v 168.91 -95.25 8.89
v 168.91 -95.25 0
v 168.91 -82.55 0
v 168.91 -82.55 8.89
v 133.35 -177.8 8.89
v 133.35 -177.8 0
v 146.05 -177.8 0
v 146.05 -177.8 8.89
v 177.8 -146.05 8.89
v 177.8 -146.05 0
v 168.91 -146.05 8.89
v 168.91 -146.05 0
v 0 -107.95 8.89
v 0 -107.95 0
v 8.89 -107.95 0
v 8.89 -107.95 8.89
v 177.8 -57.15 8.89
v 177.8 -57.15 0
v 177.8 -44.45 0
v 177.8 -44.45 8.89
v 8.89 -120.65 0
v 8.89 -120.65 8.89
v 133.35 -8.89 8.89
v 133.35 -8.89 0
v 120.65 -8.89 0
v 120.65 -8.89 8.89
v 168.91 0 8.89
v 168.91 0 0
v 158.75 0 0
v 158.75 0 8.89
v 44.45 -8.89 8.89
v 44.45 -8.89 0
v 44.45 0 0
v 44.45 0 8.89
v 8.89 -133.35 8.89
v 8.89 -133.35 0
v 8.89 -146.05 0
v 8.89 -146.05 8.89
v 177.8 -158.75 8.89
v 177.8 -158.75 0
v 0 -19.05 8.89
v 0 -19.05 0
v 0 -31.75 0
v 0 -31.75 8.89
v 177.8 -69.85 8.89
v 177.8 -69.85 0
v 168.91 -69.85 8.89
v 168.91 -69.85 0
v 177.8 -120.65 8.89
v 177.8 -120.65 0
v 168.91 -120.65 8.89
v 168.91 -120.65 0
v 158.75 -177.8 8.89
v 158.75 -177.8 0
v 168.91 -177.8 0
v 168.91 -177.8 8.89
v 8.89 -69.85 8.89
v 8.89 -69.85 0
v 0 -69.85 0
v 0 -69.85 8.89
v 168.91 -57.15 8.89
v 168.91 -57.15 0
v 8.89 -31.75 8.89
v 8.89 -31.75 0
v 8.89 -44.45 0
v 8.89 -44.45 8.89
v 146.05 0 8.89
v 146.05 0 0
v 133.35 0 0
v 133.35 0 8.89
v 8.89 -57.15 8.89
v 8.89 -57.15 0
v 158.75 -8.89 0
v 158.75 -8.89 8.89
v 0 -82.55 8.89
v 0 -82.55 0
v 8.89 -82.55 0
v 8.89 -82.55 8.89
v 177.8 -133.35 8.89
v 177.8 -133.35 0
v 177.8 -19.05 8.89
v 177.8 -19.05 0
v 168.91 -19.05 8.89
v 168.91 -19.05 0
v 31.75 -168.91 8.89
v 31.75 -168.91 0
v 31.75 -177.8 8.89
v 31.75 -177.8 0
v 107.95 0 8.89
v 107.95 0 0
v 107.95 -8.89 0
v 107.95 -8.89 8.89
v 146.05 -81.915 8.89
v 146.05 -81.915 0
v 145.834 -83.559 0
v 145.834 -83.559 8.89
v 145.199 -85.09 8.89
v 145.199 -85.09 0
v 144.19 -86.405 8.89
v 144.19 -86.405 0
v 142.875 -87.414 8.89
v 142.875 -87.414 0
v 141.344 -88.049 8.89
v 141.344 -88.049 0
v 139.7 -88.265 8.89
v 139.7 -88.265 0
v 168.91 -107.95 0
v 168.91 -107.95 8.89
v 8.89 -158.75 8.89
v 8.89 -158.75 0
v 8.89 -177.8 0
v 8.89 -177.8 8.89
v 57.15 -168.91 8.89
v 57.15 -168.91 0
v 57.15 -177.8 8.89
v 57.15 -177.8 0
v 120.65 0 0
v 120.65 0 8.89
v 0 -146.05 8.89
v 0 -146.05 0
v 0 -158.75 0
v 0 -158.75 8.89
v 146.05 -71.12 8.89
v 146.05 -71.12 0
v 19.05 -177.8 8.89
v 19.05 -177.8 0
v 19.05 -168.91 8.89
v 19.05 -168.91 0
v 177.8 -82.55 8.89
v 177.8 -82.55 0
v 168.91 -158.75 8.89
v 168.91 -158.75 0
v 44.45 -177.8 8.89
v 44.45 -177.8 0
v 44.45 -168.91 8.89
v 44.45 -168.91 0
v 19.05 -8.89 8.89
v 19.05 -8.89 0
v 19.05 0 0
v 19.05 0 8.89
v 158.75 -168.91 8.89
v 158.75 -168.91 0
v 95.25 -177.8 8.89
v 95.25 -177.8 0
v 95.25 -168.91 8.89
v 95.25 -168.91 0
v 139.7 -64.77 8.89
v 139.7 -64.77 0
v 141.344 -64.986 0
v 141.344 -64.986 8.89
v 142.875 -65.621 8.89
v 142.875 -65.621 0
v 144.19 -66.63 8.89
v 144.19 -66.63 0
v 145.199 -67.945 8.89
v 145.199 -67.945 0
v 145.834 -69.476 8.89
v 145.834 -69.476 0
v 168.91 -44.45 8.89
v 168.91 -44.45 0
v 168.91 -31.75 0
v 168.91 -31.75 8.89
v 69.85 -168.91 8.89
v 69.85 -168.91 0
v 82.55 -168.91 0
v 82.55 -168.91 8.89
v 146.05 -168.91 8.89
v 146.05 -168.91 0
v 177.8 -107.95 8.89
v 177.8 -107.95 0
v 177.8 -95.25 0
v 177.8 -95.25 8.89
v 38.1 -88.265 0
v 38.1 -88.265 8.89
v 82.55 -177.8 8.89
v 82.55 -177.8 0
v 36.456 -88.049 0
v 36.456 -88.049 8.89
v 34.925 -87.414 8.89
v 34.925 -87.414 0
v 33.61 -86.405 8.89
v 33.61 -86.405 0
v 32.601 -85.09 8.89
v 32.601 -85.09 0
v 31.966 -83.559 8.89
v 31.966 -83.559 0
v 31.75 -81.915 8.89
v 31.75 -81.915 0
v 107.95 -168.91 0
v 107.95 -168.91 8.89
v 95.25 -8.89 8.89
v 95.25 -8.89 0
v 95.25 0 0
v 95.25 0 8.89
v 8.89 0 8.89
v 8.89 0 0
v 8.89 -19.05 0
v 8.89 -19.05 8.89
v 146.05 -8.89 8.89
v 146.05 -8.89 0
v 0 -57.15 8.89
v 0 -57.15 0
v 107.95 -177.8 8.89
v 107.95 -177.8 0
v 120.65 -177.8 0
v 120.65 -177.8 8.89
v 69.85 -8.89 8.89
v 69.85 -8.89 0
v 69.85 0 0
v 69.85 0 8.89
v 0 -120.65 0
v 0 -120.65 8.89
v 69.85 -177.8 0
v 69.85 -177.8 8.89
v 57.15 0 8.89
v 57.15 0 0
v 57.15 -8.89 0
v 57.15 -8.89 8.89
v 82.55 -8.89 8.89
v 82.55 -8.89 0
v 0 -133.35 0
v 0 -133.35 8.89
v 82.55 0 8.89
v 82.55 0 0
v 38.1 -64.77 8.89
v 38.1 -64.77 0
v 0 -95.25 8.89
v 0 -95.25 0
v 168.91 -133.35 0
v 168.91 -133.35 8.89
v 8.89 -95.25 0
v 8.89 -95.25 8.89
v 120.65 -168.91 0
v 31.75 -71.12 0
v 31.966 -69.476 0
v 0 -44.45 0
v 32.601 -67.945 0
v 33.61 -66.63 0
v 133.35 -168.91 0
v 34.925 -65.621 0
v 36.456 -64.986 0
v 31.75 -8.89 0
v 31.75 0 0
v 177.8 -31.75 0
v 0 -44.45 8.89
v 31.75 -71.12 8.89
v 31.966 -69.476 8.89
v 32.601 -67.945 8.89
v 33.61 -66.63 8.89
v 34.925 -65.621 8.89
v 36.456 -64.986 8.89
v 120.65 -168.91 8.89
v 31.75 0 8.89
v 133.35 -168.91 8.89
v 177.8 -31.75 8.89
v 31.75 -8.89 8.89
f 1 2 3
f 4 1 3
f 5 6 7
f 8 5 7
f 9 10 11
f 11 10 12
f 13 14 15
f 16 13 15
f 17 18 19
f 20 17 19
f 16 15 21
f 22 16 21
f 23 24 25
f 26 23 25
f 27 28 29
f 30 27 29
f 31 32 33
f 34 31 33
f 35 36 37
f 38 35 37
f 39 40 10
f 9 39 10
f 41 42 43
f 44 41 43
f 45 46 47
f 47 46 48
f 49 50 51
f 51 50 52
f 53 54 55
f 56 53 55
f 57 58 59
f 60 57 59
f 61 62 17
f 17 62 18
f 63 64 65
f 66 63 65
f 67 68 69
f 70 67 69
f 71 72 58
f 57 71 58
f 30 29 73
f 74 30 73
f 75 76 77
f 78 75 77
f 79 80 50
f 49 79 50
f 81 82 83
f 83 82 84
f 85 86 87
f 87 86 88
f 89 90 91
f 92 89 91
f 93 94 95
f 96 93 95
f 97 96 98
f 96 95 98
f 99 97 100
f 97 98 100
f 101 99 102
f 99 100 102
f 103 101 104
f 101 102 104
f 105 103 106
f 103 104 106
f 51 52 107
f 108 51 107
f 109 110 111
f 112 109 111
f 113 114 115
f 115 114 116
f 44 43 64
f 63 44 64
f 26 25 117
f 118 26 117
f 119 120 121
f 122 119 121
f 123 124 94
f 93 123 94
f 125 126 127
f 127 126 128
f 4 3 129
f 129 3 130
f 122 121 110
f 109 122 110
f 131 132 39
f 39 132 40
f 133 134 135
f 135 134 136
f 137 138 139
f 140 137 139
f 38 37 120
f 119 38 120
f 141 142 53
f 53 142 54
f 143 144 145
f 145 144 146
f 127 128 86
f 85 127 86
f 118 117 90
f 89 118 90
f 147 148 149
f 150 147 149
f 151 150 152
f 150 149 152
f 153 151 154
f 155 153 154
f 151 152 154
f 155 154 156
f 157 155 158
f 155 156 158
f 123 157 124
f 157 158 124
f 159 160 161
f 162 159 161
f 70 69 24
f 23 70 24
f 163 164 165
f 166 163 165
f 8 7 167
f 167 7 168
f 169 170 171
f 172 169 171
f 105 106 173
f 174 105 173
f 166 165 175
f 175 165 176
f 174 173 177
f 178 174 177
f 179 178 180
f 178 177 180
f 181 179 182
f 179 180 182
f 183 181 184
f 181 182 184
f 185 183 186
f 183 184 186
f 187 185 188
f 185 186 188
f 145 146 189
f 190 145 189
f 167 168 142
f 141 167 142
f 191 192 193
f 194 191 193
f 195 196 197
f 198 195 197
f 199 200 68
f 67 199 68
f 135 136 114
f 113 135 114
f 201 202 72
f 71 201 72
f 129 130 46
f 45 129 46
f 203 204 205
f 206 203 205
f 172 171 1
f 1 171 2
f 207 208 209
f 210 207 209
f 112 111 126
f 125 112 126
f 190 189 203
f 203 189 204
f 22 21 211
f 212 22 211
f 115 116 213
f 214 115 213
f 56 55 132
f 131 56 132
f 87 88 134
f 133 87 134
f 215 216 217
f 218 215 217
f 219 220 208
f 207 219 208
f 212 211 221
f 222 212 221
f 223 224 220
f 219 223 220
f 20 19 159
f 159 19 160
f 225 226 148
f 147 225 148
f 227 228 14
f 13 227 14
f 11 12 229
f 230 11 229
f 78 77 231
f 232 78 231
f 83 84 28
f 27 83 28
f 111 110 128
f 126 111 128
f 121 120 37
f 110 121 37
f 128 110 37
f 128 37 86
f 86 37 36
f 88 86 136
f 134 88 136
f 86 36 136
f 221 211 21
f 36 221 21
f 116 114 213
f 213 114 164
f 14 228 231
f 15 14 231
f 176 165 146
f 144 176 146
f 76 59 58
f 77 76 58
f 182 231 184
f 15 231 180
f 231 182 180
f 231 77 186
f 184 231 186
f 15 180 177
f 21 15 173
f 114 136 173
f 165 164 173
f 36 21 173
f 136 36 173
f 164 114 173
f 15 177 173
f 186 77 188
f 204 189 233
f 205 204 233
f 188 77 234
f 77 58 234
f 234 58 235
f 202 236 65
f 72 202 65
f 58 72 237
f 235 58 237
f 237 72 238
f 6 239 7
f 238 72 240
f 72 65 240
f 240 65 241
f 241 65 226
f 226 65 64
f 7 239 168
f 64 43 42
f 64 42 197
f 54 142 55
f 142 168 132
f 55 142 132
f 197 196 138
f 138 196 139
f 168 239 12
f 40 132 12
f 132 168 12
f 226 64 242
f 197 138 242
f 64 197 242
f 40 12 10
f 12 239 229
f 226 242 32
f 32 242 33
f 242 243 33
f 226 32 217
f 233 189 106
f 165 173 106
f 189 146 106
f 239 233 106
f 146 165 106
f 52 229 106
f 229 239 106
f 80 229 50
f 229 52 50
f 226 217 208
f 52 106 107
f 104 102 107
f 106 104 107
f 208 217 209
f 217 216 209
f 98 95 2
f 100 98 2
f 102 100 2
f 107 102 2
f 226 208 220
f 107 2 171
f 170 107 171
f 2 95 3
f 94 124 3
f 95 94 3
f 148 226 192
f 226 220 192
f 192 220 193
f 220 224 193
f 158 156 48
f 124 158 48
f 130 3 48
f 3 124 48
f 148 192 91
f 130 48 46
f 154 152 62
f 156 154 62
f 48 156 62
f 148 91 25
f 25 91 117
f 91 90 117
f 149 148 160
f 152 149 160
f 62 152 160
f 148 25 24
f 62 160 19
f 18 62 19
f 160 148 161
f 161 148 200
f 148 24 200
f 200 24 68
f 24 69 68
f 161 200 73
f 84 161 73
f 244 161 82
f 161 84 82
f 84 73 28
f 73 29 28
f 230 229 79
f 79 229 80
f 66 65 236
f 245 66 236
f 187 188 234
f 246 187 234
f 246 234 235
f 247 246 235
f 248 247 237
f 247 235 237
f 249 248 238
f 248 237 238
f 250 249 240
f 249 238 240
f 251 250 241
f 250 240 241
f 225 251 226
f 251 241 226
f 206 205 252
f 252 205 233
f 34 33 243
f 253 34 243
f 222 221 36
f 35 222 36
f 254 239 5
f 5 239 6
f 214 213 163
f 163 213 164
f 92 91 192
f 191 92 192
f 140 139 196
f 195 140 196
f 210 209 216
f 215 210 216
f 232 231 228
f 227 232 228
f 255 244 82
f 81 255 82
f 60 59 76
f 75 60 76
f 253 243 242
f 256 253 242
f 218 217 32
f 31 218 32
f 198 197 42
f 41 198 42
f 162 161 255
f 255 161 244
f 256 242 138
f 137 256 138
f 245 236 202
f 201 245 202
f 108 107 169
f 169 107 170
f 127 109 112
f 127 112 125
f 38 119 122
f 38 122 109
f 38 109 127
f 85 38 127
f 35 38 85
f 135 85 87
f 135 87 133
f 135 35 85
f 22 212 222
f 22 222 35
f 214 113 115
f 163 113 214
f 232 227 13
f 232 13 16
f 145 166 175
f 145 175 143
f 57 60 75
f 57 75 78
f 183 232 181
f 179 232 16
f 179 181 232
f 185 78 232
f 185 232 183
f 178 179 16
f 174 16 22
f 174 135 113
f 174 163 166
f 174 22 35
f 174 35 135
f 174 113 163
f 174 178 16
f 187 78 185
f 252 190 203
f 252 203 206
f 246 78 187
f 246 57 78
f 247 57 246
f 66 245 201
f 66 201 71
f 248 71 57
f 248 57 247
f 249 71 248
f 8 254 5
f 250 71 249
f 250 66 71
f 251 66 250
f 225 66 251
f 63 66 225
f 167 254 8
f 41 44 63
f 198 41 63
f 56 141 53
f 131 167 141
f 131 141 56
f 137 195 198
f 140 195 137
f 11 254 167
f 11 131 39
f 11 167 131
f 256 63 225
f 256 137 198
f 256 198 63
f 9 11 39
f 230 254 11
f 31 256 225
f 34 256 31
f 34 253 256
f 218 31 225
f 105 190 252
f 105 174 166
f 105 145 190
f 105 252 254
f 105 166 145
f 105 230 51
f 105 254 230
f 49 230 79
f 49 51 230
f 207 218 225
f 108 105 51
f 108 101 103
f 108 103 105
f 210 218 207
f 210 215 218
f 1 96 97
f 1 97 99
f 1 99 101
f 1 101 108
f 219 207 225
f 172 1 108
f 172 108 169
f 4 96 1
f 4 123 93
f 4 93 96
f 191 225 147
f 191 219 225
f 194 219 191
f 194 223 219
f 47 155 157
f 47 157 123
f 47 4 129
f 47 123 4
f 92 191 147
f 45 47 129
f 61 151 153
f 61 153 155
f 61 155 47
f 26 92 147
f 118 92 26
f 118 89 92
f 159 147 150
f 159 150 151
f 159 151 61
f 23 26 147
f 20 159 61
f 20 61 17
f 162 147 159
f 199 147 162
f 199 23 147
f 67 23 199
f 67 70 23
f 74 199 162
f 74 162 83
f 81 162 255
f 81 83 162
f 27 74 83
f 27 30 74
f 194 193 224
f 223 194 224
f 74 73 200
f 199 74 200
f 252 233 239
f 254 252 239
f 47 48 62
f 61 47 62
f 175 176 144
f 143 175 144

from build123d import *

# Parameters (mm, degrees)
F1_DEPTH = 8.89


with BuildPart() as f1:
    # F0 (on Top) → F1 (new body)
    with BuildSketch(Plane.XY):
        Polygon((19.05, 0), (8.89, 0), (8.89, -19.05), (0, -19.05), (0, -31.75), (8.89, -31.75), (8.89, -44.45), (0, -44.45), (0, -57.15), (8.89, -57.15), (8.89, -69.85), (0, -69.85), (0, -82.55), (8.89, -82.55), (8.89, -95.25), (0, -95.25), (0, -107.95), (8.89, -107.95), (8.89, -120.65), (0, -120.65), (0, -133.35), (8.89, -133.35), (8.89, -146.05), (0, -146.05), (0, -158.75), (8.89, -158.75), (8.89, -177.8), (19.05, -177.8), (19.05, -168.91), (31.75, -168.91), (31.75, -177.8), (44.45, -177.8), (44.45, -168.91), (57.15, -168.91), (57.15, -177.8), (69.85, -177.8), (69.85, -168.91), (82.55, -168.91), (82.55, -177.8), (95.25, -177.8), (95.25, -168.91), (107.95, -168.91), (107.95, -177.8), (120.65, -177.8), (120.65, -168.91), (133.35, -168.91), (133.35, -177.8), (146.05, -177.8), (146.05, -168.91), (158.75, -168.91), (158.75, -177.8), (168.91, -177.8), (168.91, -158.75), (177.8, -158.75), (177.8, -146.05), (168.91, -146.05), (168.91, -133.35), (177.8, -133.35), (177.8, -120.65), (168.91, -120.65), (168.91, -107.95), (177.8, -107.95), (177.8, -95.25), (168.91, -95.25), (168.91, -82.55), (177.8, -82.55), (177.8, -69.85), (168.91, -69.85), (168.91, -57.15), (177.8, -57.15), (177.8, -44.45), (168.91, -44.45), (168.91, -31.75), (177.8, -31.75), (177.8, -19.05), (168.91, -19.05), (168.91, 0), (158.75, 0), (158.75, -8.89), (146.05, -8.89), (146.05, 0), (133.35, 0), (133.35, -8.89), (120.65, -8.89), (120.65, 0), (107.95, 0), (107.95, -8.89), (95.25, -8.89), (95.25, 0), (82.55, 0), (82.55, -8.89), (69.85, -8.89), (69.85, 0), (57.15, 0), (57.15, -8.89), (44.45, -8.89), (44.45, 0), (31.75, 0), (31.75, -8.89), (19.05, -8.89), align=None)
        with BuildLine():
            ThreePointArc((31.75, -71.12), (33.609872, -66.629872), (38.1, -64.77))
            Line((38.1, -64.77), (139.7, -64.77))
            ThreePointArc((139.7, -64.77), (144.190128, -66.629872), (146.05, -71.12))
            Line((146.05, -71.12), (146.05, -81.915))
            ThreePointArc((146.05, -81.915), (144.190128, -86.405128), (139.7, -88.265))
            Line((139.7, -88.265), (38.1, -88.265))
            ThreePointArc((38.1, -88.265), (33.609872, -86.405128), (31.75, -81.915))
            Line((31.75, -81.915), (31.75, -71.12))
        make_face(mode=Mode.SUBTRACT)
    extrude(amount=F1_DEPTH)


solid = f1.part
